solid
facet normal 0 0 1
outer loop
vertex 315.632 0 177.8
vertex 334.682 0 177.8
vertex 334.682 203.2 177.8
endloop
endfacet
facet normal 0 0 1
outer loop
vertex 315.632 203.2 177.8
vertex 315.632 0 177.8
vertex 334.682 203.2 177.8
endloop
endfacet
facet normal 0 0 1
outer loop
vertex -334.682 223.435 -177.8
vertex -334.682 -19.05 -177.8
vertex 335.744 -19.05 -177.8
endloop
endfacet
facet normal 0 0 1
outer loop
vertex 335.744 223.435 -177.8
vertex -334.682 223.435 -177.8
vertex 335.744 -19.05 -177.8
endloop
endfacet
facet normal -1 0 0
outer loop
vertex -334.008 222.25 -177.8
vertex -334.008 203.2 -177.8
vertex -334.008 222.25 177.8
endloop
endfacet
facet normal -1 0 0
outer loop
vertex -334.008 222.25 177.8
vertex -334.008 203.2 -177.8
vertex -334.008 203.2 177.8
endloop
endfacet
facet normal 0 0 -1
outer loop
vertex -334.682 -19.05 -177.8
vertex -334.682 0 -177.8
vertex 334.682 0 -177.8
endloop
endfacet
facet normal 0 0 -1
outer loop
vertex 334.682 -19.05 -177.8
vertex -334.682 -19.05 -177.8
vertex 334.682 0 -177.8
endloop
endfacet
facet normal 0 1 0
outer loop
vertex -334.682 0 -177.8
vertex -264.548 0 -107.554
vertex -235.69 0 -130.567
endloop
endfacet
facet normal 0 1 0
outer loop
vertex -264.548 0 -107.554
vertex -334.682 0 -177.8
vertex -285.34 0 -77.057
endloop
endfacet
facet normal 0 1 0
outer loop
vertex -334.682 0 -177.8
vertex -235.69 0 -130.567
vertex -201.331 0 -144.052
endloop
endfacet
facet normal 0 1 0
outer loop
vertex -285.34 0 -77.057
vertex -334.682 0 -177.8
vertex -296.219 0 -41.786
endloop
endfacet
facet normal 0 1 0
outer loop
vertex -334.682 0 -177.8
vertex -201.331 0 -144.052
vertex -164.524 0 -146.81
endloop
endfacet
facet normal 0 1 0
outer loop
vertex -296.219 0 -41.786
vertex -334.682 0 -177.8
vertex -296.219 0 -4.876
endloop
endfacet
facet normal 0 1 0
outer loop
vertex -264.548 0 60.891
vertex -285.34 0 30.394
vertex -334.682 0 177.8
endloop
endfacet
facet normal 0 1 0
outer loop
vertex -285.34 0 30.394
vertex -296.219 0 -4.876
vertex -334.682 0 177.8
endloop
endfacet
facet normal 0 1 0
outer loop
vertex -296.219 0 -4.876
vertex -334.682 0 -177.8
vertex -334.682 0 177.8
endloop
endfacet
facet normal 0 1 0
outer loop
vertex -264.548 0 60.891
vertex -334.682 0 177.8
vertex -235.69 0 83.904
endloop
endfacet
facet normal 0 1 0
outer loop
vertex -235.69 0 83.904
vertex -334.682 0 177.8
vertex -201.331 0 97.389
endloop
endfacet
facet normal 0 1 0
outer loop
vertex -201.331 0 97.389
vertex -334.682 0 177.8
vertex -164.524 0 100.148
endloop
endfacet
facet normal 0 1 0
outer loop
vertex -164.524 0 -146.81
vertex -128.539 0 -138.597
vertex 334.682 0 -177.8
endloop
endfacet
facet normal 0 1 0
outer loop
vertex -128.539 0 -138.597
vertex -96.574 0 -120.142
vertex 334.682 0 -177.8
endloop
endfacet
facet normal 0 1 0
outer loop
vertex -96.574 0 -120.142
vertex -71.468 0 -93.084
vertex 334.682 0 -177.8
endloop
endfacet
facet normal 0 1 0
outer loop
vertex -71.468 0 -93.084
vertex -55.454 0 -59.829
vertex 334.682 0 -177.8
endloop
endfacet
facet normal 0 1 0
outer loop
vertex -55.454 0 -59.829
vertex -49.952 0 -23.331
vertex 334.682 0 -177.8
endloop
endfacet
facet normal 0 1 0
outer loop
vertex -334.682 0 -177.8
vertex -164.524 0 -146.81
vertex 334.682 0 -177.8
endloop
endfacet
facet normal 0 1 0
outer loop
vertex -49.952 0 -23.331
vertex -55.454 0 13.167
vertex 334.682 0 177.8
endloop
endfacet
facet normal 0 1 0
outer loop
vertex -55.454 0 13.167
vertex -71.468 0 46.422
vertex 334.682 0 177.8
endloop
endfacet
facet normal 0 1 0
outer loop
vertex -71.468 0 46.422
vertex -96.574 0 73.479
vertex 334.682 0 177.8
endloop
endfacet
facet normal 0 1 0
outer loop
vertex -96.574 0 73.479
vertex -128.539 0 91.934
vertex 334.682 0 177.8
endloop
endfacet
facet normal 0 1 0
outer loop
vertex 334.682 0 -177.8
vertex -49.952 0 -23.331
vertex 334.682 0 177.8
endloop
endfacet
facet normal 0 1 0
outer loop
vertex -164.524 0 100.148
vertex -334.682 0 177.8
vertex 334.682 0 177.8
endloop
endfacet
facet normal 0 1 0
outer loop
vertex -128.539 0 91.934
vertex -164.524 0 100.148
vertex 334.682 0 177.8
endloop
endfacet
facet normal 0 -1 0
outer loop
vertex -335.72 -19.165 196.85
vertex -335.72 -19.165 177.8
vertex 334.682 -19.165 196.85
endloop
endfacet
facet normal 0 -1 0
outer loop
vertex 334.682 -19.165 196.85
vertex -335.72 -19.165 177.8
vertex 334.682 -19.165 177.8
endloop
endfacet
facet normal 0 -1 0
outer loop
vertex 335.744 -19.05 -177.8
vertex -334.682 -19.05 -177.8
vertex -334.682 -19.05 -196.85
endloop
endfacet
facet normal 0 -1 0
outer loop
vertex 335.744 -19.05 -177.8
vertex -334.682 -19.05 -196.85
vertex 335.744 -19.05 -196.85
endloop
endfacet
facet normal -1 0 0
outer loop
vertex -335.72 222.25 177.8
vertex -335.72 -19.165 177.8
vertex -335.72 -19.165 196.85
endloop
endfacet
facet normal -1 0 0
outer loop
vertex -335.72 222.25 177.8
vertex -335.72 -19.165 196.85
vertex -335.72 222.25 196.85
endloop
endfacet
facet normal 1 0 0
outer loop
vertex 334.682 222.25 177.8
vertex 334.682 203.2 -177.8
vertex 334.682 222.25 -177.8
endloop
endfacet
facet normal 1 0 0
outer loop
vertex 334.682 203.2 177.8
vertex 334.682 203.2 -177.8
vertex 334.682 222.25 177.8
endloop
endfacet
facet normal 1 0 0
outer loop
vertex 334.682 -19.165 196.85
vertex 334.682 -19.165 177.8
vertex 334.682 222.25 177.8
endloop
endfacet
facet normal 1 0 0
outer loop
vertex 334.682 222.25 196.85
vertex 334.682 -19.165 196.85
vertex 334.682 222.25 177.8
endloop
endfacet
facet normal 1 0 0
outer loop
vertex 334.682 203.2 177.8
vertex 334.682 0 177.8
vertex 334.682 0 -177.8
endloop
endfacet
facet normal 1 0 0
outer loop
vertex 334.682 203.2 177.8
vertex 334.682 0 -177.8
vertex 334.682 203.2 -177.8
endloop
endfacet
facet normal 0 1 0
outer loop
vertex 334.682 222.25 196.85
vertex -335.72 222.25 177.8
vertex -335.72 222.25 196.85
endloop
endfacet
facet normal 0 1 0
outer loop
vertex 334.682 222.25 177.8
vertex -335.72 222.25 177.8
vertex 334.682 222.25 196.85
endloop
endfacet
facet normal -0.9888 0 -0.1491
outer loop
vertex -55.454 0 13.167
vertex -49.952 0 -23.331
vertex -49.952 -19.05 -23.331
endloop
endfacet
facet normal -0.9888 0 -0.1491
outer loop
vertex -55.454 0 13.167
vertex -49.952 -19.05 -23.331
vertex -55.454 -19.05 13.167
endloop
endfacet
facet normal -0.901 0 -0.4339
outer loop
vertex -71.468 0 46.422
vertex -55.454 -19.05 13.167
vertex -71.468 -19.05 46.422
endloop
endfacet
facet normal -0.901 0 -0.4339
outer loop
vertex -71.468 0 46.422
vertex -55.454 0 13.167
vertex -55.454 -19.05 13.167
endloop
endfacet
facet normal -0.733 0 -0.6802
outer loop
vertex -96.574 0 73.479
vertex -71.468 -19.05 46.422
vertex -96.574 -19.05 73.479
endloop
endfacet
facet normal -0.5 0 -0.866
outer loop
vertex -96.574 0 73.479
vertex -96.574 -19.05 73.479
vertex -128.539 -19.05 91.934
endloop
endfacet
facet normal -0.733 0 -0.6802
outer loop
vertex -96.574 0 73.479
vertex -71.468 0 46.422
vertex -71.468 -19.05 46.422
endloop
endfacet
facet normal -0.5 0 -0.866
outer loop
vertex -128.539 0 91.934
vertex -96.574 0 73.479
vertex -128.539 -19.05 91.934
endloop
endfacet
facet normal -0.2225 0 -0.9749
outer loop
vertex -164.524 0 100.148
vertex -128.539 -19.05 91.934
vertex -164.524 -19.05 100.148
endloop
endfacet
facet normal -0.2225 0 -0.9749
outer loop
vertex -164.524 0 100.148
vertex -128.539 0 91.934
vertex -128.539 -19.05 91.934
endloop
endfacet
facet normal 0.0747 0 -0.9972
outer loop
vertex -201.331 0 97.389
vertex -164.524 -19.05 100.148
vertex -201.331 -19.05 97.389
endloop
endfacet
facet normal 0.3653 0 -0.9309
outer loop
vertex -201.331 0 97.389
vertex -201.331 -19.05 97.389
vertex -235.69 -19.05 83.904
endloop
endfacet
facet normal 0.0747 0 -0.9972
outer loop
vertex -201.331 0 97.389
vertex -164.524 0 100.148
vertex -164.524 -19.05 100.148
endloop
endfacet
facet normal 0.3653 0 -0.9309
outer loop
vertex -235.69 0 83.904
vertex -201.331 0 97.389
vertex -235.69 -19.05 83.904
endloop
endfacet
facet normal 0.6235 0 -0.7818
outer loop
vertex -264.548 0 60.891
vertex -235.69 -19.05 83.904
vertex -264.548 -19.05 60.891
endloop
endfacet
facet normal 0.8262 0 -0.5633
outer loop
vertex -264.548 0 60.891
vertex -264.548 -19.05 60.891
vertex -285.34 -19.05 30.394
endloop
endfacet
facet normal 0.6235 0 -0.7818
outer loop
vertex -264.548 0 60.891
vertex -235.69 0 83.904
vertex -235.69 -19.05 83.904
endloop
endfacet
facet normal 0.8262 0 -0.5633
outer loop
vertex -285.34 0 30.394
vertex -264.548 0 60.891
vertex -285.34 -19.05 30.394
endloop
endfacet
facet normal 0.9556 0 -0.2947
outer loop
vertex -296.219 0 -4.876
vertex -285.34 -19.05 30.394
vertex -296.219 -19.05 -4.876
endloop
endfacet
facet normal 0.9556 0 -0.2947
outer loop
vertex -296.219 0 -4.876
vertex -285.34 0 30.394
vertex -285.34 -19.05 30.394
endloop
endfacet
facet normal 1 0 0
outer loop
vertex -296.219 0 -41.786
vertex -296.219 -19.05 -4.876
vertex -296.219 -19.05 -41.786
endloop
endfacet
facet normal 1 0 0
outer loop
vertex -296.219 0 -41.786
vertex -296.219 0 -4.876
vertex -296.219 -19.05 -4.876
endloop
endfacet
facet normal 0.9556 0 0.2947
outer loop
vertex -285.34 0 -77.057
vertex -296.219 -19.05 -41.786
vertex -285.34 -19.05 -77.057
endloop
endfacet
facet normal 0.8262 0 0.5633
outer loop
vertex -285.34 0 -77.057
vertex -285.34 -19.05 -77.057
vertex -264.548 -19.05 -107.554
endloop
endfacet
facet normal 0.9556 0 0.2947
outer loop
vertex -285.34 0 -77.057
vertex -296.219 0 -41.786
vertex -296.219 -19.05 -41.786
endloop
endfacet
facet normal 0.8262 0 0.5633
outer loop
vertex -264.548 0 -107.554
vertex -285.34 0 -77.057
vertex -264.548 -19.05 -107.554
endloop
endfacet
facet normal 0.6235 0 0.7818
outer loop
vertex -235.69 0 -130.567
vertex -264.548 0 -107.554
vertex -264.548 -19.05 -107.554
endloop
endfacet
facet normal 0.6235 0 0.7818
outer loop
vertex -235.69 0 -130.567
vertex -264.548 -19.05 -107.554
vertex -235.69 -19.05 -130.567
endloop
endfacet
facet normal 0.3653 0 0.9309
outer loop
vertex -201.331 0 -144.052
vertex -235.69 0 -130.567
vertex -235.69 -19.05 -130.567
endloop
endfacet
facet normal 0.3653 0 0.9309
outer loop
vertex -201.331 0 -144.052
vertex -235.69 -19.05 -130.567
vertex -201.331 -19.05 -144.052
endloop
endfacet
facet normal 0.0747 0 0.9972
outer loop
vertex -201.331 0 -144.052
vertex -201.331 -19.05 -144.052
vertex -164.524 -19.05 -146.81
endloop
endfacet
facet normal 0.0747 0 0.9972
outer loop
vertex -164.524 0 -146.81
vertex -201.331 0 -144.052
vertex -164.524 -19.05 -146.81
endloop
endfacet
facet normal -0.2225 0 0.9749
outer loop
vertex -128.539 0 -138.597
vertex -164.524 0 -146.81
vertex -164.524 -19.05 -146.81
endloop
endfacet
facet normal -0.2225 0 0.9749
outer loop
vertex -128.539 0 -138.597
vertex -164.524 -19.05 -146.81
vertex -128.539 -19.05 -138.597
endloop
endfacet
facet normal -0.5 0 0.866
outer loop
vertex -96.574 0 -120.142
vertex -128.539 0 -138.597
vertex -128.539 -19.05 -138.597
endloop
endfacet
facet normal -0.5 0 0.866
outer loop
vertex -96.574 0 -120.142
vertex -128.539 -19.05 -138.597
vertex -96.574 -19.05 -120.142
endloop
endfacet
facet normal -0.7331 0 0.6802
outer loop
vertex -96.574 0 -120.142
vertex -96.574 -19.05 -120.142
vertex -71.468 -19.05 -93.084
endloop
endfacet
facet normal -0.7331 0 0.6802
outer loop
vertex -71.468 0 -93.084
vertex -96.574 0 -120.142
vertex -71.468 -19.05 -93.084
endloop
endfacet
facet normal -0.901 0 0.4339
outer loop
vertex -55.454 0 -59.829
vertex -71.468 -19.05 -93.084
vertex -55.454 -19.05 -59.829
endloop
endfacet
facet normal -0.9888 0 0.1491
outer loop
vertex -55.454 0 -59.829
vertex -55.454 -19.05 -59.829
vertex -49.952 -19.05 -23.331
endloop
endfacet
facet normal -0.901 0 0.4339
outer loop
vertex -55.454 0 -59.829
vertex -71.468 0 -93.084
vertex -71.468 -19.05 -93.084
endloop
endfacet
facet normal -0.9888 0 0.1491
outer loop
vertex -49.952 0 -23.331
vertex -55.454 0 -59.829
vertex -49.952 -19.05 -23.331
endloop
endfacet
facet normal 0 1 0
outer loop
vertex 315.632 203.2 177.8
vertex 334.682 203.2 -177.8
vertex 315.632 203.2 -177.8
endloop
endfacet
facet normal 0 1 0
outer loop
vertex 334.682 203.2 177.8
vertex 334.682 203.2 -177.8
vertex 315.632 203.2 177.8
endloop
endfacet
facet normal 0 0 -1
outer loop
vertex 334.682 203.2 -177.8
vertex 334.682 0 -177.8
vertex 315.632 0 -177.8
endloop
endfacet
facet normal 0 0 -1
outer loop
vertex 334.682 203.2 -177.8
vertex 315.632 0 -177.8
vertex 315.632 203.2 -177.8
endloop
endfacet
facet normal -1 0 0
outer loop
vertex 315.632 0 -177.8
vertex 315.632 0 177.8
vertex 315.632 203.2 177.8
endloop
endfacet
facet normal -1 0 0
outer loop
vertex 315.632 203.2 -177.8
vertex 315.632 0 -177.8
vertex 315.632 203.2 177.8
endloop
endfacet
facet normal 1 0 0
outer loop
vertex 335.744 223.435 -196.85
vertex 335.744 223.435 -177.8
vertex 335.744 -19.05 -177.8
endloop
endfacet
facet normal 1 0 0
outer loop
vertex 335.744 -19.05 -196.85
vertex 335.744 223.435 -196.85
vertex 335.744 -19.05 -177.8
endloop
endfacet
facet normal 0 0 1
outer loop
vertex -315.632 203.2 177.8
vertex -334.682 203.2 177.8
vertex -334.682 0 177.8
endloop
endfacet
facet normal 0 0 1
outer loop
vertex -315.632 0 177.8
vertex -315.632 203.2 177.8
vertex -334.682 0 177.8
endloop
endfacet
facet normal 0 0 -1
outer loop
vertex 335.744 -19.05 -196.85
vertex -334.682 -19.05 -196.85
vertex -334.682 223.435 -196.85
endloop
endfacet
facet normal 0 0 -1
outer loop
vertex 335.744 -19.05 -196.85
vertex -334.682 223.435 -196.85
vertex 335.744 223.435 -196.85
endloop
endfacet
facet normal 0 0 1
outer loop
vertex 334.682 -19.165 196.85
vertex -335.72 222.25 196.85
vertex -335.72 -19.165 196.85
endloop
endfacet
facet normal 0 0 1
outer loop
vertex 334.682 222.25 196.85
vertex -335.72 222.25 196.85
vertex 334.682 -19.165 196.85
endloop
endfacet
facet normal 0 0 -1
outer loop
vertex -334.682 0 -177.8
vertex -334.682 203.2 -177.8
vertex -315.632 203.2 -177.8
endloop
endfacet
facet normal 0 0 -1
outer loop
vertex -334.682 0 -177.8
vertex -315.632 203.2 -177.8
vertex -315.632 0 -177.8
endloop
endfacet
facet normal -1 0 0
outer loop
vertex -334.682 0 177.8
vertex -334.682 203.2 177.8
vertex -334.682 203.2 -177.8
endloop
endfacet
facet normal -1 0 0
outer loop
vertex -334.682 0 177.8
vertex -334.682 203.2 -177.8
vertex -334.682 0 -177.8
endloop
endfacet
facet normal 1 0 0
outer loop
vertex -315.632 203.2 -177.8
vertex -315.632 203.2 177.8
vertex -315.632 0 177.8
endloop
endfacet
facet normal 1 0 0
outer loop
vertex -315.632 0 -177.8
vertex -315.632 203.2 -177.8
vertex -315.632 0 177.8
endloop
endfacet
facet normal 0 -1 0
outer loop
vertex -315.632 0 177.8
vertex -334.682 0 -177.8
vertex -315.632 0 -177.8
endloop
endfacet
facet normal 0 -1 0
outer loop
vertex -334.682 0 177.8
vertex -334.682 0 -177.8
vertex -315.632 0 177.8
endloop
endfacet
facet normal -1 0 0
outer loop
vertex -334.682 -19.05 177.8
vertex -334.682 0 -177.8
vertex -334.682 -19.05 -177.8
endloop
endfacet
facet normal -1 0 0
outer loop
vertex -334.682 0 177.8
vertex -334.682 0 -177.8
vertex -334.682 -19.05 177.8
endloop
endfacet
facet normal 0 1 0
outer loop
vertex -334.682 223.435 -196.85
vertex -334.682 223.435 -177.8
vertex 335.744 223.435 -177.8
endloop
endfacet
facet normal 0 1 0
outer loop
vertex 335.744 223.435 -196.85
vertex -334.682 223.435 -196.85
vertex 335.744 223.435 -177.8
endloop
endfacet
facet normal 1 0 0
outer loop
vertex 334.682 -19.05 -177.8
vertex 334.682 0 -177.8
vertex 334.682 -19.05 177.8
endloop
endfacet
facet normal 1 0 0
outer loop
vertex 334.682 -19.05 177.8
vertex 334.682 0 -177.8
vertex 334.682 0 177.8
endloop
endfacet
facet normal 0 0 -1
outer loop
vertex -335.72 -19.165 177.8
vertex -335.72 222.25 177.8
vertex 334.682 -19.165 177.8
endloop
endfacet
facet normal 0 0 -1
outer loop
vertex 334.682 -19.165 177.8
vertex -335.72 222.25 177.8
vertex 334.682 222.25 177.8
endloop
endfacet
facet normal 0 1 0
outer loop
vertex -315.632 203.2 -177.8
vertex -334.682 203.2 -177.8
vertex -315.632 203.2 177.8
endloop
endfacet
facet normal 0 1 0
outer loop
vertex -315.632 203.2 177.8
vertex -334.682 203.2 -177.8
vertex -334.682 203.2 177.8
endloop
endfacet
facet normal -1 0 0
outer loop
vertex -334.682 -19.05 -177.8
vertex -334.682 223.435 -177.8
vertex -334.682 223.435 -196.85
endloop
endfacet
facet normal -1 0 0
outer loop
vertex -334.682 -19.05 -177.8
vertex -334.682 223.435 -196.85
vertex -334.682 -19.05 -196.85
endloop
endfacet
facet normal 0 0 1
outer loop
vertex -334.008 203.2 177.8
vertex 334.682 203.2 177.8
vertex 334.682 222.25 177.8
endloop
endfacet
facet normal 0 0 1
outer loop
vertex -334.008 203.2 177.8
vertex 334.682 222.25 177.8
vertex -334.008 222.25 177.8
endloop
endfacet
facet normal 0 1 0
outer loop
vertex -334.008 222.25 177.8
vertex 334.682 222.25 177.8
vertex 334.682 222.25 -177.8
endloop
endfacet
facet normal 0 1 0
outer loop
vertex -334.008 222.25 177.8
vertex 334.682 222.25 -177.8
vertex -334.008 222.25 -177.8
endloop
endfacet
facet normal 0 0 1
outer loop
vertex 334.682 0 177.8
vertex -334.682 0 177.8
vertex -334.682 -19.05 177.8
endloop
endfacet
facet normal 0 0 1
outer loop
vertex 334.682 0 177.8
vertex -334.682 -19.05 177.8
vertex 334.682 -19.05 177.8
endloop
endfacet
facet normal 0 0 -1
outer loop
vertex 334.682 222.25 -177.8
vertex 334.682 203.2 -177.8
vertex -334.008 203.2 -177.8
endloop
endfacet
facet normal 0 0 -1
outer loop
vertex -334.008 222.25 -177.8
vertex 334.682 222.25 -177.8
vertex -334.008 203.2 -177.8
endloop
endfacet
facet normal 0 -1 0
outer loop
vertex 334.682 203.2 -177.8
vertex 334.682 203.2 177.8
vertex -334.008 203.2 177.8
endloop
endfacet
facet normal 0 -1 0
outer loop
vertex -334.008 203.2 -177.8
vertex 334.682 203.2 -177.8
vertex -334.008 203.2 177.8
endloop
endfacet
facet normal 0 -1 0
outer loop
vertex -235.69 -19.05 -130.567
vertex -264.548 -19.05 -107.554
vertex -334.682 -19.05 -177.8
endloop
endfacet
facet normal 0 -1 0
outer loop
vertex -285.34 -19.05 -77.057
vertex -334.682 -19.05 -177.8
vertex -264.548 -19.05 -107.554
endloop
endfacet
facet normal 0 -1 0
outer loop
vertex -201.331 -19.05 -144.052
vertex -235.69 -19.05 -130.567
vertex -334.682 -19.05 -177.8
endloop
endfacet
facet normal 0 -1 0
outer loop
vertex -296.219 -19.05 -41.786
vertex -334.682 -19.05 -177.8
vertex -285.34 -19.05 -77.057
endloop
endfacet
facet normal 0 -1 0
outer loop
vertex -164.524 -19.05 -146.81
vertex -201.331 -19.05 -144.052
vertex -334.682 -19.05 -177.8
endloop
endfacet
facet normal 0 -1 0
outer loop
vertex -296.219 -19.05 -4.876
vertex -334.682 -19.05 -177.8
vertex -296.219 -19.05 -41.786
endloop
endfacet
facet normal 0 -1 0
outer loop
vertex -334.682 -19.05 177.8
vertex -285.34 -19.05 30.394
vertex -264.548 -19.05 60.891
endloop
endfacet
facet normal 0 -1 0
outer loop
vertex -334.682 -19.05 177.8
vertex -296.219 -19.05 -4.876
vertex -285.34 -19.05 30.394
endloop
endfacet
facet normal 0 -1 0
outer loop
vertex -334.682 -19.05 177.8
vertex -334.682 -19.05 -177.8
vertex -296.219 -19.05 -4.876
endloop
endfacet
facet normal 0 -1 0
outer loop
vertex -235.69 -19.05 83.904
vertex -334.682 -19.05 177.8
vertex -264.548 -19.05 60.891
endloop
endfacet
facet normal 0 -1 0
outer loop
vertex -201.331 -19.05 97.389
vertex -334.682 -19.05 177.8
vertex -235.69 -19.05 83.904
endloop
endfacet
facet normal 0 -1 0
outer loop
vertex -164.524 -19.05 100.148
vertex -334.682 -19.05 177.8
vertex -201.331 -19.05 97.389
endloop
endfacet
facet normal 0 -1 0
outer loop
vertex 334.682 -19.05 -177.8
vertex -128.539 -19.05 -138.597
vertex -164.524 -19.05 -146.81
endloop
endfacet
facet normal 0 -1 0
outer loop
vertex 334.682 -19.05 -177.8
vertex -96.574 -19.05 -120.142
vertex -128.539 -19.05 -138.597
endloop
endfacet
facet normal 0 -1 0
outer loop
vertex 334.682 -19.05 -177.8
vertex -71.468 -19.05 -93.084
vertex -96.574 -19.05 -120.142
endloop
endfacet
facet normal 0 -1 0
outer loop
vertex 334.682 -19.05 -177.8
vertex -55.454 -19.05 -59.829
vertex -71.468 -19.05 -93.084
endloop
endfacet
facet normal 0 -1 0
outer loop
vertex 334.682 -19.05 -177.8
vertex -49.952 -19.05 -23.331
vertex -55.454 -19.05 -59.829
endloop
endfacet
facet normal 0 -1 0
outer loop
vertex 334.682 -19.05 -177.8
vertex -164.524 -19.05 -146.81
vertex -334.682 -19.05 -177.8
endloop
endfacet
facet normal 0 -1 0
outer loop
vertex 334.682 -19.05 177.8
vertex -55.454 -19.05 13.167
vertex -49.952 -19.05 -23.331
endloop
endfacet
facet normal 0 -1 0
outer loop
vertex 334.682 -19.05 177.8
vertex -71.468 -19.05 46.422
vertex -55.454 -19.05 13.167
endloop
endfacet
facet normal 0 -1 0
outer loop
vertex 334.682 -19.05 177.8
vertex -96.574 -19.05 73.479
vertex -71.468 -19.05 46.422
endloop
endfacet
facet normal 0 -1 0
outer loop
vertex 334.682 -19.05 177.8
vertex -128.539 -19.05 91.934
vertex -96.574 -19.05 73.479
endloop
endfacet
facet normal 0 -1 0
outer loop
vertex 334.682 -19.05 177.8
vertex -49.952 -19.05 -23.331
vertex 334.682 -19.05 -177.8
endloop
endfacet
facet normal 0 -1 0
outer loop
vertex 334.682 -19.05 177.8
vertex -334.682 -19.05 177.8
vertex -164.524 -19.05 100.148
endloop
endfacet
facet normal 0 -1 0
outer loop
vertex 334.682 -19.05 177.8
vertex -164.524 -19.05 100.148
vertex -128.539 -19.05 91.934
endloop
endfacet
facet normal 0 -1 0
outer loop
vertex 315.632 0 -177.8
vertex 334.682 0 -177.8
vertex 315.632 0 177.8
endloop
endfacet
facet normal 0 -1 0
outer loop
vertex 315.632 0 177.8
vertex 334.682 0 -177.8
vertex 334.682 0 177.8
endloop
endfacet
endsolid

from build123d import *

# Parameters (mm, degrees)
F0_W      = 669.364716
F0_H      = 355.6
F0_R      = 123.825
F1_DEPTH  = 19.05
F2_W      = 203.2
F2_H      = 355.6
F3_DEPTH  = 19.05
F4_W      = 203.2
F4_H      = 355.6
F5_DEPTH  = 19.05
F6_W      = 668.690813
F6_H      = 355.6
F7_DEPTH  = 19.05
F8_W      = 670.426292
F8_H      = 242.48494
F9_DEPTH  = 19.05
F10_W     = 670.402688
F10_H     = 241.414734
F11_DEPTH = 19.05


with BuildPart() as f1:
    # F0 (on Front) → F1 (new body)
    with BuildSketch(Plane.XZ):
        Rectangle(F0_W, F0_H)
        with Locations((-173.777369, -23.33122)):
            Circle(F0_R, mode=Mode.SUBTRACT)
    extrude(amount=F1_DEPTH)


with BuildPart() as f3:
    # F2 (on face) → F3 (new body)
    with BuildSketch(Plane.YZ.offset(334.682358)):
        with Locations((101.6, 0)):
            Rectangle(F2_W, F2_H)
    extrude(amount=-F3_DEPTH)


with BuildPart() as f5:
    # F4 (on face) → F5 (new body)
    with BuildSketch(Plane(origin=(-334.682358, 0, 0), x_dir=(0, -1, 0), z_dir=(-1, 0, 0))):
        with Locations((-101.6, 0)):
            Rectangle(F4_W, F4_H)
    extrude(amount=-F5_DEPTH)


with BuildPart() as f7:
    # F6 (on face) → F7 (new body)
    with BuildSketch(Plane(origin=(0, 203.2, 0), x_dir=(-1, 0, 0), z_dir=(0, 1, 0))):
        with Locations((-0.336951, 0)):
            Rectangle(F6_W, F6_H)
    extrude(amount=F7_DEPTH)


with BuildPart() as f9:
    # F8 (on face) → F9 (new body)
    with BuildSketch(Plane(origin=(0, 0, -177.8), x_dir=(1, 0, 0), z_dir=(0, 0, -1))):
        with Locations((0.530788, -102.19247)):
            Rectangle(F8_W, F8_H)
    extrude(amount=F9_DEPTH)


with BuildPart() as f11:
    # F10 (on face) → F11 (new body)
    with BuildSketch(Plane.XY.offset(177.8)):
        with Locations((-0.518986, 101.542633)):
            Rectangle(F10_W, F10_H)
    extrude(amount=F11_DEPTH)


solid = Compound([f1.part, f3.part, f5.part, f7.part, f9.part, f11.part])
